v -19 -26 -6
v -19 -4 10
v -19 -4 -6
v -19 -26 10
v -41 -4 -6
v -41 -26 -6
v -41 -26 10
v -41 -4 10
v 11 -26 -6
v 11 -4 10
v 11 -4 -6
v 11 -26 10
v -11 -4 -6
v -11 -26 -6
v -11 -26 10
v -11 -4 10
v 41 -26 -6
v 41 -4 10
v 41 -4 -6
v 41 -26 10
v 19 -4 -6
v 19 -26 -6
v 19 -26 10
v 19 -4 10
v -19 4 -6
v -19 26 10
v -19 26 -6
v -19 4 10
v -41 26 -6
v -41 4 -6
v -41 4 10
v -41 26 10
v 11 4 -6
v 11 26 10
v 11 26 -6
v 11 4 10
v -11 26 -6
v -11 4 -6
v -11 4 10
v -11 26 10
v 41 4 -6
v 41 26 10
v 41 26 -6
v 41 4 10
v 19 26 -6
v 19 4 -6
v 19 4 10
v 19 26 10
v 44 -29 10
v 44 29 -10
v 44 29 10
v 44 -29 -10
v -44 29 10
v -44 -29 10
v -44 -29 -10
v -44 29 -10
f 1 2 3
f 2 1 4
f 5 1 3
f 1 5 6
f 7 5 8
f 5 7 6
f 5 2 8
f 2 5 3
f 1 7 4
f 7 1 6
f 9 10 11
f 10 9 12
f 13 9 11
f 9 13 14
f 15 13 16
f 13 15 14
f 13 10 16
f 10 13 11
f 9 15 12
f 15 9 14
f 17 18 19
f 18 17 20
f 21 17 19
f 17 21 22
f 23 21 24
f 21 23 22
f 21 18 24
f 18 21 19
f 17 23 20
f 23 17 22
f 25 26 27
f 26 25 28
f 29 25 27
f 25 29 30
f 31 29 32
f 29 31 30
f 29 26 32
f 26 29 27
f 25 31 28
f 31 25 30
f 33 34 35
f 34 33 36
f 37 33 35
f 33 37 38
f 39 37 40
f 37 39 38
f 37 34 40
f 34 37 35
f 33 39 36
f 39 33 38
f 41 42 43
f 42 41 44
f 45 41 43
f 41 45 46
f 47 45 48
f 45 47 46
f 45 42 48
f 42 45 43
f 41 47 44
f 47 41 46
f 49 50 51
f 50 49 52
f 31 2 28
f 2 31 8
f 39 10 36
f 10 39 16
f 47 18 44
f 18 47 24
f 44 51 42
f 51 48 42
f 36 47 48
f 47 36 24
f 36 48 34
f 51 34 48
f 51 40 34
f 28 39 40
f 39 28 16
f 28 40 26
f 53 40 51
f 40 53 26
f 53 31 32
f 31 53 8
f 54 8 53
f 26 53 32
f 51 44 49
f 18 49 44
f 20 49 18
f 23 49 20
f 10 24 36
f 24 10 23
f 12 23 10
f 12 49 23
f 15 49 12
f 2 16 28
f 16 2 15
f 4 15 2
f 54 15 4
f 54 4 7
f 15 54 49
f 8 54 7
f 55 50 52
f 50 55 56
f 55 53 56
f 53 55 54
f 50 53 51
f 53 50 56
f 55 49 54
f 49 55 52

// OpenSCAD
$fn = 32;

// ----------------------------------------------------------------------
// Pocket plate 88 x 58 x 20
// 2 x 3 pockets 22 mm square, 16 mm deep
// ----------------------------------------------------------------------

// --- parameters (mm) ---
thickness = 20;  // plate thickness
floor_t = 4;     // material left under each pocket
pocket = 22;     // pocket side length
pitch_x = 30;    // pocket pitch along X
pitch_y = 30;    // pocket pitch along Y
cols = 3;        // pockets per row
rows = 2;        // rows of pockets

// --- derived feature positions (mm) ---
depth = thickness - floor_t;        // = 16   pocket depth, down to the floor
span_x = (cols - 1) * pitch_x;      // = 60   distance between outer pockets
span_y = (rows - 1) * pitch_y;      // = 30   distance between outer pocket rows
origin_x = -span_x / 2;             // = -30   X of the first pocket
origin_y = -span_y / 2;             // = -15   Y of the first pocket
plate = [span_x + pocket + 6, span_y + pocket + 6, thickness];  // = [88, 58, 20]   overall size: pockets plus 3 mm of wall on each side
feature_centers = [
  [origin_x + 0 * pitch_x, origin_y + 0 * pitch_y],
  [origin_x + 1 * pitch_x, origin_y + 0 * pitch_y],
  [origin_x + 2 * pitch_x, origin_y + 0 * pitch_y],
  [origin_x + 0 * pitch_x, origin_y + 1 * pitch_y],
  [origin_x + 1 * pitch_x, origin_y + 1 * pitch_y],
  [origin_x + 2 * pitch_x, origin_y + 1 * pitch_y]
];   // pocket centres, used verbatim by the cutter loop

// plate outline, then one pocket per centre in feature_centers
difference() {
  cube(plate, center = true);
  for (centre = feature_centers)
    translate([centre[0] - pocket / 2, centre[1] - pocket / 2, plate[2] / 2 - depth])
      cube([pocket, pocket, depth + 1]);  // centred on the declared pocket centre
}
